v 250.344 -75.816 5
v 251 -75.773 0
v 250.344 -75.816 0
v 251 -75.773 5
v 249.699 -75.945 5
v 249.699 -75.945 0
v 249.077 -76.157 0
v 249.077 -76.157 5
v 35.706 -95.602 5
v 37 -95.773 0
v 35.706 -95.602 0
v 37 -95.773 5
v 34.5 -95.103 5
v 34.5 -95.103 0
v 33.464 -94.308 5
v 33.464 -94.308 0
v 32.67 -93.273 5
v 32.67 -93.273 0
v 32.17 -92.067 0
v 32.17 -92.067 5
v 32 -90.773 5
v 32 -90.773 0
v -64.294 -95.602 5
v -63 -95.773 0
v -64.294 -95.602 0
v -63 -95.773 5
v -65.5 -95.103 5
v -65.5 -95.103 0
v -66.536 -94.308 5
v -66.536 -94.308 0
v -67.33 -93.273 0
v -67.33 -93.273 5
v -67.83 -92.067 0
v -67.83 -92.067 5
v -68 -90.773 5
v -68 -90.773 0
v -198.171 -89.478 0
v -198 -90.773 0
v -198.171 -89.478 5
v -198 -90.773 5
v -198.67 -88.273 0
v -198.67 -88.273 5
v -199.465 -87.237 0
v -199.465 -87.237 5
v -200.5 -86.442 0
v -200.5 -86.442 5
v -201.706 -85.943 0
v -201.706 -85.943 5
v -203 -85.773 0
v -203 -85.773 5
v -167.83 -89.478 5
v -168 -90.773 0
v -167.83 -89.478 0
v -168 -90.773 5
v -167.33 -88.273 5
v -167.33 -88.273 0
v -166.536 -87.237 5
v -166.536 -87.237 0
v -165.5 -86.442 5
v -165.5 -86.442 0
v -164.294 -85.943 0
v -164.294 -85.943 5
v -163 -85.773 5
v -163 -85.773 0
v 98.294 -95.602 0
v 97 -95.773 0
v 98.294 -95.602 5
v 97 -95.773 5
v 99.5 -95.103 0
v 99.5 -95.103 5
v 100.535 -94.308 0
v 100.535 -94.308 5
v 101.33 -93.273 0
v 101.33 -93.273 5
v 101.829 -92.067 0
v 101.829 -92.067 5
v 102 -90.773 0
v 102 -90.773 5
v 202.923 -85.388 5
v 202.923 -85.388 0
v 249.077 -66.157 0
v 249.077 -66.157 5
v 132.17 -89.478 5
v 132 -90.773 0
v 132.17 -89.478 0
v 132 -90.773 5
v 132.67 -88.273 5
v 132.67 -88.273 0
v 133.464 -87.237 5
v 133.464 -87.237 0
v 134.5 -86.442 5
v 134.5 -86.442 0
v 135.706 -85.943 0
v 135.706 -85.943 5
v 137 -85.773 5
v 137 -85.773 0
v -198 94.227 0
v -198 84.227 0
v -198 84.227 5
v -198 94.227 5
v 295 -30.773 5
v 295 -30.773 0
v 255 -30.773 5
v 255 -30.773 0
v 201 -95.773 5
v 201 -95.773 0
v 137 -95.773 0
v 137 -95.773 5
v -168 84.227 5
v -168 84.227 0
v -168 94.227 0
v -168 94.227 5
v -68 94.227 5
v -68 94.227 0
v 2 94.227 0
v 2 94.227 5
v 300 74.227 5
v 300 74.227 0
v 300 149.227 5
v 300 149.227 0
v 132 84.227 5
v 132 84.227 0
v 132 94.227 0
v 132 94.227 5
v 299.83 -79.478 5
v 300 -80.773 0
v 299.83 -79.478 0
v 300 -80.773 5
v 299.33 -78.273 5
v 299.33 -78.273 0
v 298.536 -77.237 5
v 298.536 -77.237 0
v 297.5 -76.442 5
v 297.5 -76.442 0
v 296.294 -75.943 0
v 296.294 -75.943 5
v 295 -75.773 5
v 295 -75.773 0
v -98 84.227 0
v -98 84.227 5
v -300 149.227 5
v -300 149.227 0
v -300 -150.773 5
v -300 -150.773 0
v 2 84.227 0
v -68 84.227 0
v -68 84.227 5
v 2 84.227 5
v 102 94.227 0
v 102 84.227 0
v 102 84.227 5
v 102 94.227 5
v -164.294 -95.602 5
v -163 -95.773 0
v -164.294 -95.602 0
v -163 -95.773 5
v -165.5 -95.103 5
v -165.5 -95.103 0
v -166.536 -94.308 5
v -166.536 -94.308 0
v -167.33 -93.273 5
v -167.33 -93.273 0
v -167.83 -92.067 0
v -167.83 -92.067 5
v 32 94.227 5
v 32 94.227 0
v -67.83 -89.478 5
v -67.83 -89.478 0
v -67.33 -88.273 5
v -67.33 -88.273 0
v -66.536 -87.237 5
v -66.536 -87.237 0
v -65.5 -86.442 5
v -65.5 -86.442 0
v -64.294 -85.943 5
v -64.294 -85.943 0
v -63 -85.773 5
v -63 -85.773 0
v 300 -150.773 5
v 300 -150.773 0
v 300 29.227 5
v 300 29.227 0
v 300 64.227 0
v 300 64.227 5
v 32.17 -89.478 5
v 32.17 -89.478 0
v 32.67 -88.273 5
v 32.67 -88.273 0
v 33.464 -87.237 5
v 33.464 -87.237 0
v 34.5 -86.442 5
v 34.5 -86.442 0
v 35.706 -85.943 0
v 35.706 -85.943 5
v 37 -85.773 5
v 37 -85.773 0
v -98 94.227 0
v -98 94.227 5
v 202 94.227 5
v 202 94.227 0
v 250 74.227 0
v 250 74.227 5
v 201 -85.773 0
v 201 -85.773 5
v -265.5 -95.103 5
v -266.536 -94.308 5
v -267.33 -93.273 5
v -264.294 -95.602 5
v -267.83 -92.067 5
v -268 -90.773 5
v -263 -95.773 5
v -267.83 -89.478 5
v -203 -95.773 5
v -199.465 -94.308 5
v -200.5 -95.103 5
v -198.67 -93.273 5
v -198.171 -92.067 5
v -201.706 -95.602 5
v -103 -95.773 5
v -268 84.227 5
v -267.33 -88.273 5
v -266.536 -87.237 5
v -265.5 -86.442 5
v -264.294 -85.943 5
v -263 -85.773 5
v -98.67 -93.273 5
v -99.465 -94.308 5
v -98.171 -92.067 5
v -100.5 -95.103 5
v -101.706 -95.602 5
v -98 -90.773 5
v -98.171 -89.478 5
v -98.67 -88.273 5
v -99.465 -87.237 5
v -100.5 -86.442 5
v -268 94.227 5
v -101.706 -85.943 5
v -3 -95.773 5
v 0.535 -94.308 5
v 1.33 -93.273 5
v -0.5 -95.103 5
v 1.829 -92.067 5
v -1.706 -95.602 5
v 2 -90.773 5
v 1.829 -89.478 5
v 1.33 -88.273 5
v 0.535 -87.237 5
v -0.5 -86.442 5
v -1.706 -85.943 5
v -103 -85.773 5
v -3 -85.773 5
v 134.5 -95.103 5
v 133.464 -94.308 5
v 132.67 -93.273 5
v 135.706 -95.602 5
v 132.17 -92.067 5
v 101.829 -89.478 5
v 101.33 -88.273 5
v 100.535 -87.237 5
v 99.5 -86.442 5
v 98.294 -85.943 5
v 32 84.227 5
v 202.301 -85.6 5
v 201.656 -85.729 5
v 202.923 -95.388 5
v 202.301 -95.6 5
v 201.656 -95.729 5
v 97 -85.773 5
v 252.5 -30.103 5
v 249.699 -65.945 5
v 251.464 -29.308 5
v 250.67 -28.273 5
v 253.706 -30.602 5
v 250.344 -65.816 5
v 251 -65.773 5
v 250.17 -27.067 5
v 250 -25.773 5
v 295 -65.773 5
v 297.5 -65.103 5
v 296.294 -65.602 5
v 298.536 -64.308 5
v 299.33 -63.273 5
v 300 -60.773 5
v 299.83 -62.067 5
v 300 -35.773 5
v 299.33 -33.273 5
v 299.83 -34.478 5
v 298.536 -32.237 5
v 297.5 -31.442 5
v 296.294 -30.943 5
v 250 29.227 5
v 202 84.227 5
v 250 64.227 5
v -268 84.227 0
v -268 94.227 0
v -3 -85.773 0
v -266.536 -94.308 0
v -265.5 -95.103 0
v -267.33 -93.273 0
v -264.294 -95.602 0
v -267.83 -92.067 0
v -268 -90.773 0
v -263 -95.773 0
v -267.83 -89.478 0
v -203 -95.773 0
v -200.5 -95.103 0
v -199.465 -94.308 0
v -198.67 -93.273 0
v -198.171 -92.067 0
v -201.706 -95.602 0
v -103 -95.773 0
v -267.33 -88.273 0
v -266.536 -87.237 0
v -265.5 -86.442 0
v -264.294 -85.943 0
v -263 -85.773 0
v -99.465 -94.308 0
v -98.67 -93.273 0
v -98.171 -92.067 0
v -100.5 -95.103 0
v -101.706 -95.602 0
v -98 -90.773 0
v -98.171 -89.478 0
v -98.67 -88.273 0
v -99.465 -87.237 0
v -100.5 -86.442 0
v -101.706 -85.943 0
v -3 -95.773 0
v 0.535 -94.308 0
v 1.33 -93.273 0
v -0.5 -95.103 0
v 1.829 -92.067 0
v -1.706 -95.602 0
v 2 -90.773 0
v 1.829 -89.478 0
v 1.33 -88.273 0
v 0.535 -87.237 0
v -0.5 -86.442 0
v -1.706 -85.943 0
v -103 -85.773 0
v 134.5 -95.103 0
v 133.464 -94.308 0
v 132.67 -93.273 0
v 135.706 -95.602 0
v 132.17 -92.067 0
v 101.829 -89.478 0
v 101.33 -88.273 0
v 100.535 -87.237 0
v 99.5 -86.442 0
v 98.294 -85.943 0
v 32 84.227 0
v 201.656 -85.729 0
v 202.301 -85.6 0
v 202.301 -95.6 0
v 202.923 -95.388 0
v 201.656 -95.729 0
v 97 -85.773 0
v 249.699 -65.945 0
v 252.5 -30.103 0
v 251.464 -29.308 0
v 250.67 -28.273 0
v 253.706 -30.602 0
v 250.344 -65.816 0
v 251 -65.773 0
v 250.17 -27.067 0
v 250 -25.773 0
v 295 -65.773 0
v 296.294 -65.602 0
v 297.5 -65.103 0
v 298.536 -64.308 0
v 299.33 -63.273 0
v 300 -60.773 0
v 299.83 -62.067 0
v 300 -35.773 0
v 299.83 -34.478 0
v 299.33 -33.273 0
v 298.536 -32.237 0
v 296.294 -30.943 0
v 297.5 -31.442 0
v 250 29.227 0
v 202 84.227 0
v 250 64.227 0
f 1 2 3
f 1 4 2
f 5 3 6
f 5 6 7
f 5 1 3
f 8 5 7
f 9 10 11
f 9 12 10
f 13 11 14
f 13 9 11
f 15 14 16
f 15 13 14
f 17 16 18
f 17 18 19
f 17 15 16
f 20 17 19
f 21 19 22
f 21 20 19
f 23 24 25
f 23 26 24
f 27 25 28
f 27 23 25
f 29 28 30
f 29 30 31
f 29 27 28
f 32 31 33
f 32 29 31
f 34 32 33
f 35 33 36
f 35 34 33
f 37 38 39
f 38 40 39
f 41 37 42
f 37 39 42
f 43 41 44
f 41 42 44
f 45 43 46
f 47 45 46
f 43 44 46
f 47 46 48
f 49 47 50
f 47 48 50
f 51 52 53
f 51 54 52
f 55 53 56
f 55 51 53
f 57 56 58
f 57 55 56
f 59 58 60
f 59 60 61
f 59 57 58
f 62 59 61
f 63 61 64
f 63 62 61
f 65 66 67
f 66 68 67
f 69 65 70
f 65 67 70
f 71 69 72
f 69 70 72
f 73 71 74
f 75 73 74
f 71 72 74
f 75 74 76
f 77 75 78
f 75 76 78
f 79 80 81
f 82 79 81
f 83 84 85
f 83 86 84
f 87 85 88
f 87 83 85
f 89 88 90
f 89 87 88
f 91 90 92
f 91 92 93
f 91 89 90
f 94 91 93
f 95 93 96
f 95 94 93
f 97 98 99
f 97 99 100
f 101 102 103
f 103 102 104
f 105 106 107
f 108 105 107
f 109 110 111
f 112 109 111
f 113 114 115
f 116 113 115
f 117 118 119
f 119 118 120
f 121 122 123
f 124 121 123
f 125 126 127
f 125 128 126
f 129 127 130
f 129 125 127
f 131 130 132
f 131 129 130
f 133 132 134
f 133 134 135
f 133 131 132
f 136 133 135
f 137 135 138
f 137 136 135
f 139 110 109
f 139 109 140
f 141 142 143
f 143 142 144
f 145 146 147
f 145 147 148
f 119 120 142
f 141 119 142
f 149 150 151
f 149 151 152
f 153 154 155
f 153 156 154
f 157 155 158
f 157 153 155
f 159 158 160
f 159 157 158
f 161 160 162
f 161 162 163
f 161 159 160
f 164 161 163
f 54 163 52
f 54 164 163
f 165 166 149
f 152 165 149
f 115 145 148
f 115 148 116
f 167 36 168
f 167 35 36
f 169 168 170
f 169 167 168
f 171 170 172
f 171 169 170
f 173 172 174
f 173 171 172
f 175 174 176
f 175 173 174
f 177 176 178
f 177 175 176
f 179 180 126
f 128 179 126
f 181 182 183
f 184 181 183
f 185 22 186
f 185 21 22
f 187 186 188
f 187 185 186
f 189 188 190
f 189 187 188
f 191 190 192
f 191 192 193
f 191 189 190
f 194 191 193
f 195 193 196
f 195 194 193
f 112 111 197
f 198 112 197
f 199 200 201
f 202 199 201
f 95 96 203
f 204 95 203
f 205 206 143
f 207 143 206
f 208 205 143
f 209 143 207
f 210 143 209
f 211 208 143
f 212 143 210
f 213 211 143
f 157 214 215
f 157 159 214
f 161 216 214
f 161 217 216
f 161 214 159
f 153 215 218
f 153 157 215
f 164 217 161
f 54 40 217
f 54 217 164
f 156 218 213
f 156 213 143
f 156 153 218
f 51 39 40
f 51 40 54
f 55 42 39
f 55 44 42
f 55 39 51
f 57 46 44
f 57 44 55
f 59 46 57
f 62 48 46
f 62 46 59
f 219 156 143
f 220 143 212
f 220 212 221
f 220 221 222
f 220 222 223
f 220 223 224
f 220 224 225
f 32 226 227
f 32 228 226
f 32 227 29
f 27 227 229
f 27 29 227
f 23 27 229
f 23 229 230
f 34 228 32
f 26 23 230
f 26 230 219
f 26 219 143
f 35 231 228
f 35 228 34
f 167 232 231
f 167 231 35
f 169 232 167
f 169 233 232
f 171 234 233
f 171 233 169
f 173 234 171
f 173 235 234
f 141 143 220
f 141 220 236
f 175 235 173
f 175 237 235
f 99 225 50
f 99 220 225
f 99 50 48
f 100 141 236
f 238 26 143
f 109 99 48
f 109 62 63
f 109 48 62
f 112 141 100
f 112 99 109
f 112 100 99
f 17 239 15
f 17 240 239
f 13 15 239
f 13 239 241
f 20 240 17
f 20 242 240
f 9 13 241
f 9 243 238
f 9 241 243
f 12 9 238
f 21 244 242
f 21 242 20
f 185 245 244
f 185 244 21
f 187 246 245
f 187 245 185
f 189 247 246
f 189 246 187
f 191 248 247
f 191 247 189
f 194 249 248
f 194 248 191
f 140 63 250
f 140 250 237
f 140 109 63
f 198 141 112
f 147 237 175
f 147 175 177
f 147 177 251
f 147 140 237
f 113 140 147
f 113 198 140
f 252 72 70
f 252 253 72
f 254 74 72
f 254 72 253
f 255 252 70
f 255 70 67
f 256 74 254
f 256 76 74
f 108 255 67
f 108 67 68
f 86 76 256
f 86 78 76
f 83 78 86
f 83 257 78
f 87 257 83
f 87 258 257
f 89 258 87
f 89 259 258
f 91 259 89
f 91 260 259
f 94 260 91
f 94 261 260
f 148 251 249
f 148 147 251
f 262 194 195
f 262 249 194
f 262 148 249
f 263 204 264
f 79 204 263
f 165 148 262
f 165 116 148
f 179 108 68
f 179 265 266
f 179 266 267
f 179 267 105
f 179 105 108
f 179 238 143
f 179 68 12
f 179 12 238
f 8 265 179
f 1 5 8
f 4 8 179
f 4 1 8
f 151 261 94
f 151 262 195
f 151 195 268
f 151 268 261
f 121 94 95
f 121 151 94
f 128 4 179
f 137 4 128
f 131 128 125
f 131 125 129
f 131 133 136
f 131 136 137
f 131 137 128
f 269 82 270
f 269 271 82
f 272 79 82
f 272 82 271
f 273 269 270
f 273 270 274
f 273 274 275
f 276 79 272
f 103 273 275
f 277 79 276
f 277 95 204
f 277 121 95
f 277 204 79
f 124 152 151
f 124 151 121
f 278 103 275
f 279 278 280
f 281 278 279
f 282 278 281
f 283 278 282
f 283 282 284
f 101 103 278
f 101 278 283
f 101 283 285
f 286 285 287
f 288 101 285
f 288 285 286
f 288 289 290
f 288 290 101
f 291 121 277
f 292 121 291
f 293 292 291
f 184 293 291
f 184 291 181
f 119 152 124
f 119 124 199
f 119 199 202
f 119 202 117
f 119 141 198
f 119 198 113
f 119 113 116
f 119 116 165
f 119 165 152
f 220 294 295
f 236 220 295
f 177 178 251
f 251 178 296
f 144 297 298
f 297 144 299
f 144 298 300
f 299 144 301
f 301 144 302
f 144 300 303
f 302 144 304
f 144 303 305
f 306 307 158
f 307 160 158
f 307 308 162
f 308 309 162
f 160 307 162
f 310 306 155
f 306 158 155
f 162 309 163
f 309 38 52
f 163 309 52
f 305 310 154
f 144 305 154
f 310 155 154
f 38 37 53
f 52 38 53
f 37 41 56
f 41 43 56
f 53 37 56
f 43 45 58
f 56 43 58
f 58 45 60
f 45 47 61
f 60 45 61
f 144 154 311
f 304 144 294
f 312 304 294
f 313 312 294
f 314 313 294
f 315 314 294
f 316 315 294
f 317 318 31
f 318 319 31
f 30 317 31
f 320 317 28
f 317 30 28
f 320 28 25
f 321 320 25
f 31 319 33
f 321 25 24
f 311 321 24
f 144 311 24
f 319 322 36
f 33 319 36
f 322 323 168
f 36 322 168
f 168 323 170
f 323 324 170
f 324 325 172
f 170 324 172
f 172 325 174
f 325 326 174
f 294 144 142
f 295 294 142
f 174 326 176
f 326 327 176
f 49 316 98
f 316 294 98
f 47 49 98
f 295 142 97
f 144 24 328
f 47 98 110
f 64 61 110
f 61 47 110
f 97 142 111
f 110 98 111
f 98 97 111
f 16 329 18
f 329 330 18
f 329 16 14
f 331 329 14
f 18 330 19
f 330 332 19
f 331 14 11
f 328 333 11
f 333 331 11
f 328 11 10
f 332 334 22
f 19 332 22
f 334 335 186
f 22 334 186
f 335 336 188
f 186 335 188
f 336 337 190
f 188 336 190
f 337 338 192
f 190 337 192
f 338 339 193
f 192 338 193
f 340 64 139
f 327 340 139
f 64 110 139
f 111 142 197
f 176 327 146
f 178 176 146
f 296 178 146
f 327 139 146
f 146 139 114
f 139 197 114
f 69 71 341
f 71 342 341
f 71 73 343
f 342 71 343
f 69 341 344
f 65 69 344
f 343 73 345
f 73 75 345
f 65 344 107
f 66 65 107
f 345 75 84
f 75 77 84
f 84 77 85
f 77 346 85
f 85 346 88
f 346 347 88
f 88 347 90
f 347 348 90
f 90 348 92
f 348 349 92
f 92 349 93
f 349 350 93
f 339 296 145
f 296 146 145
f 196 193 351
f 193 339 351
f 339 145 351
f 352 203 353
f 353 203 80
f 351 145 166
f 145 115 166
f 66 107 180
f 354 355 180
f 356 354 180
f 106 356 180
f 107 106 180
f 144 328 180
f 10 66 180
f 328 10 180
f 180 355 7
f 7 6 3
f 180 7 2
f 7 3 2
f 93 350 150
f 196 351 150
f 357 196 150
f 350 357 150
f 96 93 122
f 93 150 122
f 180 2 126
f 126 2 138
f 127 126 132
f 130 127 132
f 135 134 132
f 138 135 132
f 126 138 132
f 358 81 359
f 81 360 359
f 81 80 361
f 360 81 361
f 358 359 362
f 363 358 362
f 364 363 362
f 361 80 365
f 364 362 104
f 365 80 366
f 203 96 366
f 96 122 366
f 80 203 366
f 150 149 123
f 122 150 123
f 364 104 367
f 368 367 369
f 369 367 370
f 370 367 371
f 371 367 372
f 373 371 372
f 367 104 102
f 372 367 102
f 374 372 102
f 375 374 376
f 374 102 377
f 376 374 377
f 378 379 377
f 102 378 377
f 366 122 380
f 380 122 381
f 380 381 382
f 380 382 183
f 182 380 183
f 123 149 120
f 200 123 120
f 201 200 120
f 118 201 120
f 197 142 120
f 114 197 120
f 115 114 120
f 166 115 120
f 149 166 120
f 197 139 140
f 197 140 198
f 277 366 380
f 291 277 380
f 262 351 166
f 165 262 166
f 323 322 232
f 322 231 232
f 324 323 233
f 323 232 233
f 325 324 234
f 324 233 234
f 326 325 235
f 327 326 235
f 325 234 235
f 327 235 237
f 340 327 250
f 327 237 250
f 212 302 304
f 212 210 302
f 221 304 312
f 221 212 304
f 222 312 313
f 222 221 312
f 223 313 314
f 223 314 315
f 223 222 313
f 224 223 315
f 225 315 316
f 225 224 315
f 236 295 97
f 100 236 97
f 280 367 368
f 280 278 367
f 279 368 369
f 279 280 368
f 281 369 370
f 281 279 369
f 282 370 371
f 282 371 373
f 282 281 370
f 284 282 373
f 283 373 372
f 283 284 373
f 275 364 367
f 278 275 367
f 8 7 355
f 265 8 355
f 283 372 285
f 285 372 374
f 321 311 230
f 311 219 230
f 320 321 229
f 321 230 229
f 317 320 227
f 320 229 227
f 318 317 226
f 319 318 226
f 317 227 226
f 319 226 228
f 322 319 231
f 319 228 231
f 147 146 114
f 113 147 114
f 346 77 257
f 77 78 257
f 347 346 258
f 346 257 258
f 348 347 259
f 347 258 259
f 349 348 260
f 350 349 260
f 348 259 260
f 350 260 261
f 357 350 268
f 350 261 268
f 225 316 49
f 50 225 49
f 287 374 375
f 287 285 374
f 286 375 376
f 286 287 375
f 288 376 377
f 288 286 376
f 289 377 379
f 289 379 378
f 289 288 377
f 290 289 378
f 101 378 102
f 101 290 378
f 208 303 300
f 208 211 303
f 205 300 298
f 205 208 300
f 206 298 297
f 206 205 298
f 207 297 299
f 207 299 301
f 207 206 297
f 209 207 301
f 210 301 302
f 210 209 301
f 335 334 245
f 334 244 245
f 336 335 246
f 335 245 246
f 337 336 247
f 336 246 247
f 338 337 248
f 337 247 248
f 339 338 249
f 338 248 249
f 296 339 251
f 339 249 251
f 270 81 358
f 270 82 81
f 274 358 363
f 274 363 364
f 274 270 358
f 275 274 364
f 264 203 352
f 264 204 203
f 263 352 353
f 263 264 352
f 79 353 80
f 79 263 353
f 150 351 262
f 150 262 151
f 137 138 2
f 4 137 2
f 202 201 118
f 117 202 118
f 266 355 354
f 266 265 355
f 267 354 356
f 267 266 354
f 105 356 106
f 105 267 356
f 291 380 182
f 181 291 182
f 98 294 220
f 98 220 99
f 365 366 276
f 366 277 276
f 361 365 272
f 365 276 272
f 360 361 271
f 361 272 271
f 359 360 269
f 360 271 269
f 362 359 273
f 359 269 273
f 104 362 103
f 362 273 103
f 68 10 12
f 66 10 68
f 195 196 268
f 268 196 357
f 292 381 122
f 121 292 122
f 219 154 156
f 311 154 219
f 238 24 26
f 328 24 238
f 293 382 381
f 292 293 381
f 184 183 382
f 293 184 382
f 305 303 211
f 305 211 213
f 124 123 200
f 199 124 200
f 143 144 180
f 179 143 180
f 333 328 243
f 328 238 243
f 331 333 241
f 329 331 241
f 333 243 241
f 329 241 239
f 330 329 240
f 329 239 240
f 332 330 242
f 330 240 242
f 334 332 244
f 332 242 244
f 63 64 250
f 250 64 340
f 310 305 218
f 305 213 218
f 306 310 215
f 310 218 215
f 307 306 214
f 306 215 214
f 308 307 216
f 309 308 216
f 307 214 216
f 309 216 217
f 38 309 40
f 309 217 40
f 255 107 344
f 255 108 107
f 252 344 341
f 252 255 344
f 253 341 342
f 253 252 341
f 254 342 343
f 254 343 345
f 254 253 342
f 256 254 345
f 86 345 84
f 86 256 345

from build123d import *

# Parameters (mm, degrees)
F0_W     = 70
F0_H     = 10
F1_DEPTH = 5
F2_R     = 4.99999


# Not quite as in the source:
# - a fillet or chamfer is up to 0.001 mm smaller than in the source, because OpenCascade refuses the exact size


with BuildPart() as f1:
    # F0 (on Top) → F1 (new body)
    with BuildSketch(Plane.XY):
        Polygon((300, 149.2274475843), (-300, 149.2274475843), (-300, -150.7725524157), (300, -150.7725524157), (300, -75.7725524157), (250, -75.7725524157), (201.9998562336, -95.7725524157), (131.9998562336, -95.7725524157), (131.9998562336, -85.7725524157), (201.9998562336, -85.7725524157), (250, -65.7725524157), (300, -65.7725524157), (300, -30.7725524157), (250, -30.7725524157), (250, 29.2274475843), (300, 29.2274475843), (300, 64.2274475843), (250, 64.2274475843), (201.9998562336, 84.2274475843), (131.9998562336, 84.2274475843), (131.9998562336, 94.2274475843), (201.9998562336, 94.2274475843), (250, 74.2274475843), (300, 74.2274475843), align=None)
        with Locations((-233.0001437664, -90.7725524157)):
            Rectangle(F0_W, F0_H, mode=Mode.SUBTRACT)
        with Locations((-133.0001437664, -90.7725524157)):
            Rectangle(F0_W, F0_H, mode=Mode.SUBTRACT)
        with Locations((-33.0001437664, -90.7725524157)):
            Rectangle(F0_W, F0_H, mode=Mode.SUBTRACT)
        with Locations((66.9998562336, -90.7725524157)):
            Rectangle(F0_W, F0_H, mode=Mode.SUBTRACT)
        with Locations((-233.0001437664, 89.2274475843)):
            Rectangle(F0_W, F0_H, mode=Mode.SUBTRACT)
        with Locations((-133.0001437664, 89.2274475843)):
            Rectangle(F0_W, F0_H, mode=Mode.SUBTRACT)
        with Locations((-33.0001437664, 89.2274475843)):
            Rectangle(F0_W, F0_H, mode=Mode.SUBTRACT)
        with Locations((66.9998562336, 89.2274475843)):
            Rectangle(F0_W, F0_H, mode=Mode.SUBTRACT)
    extrude(amount=F1_DEPTH)

    # F2 (radius 5 in the source; OpenCascade refuses exactly that, so slightly less here)
    f2_edges = [f1.edges().sort_by_distance(p)[0] for p in [
        (131.999856, -95.772552, 2.5),
        (31.999856, -95.772552, 2.5),
        (-68.000144, -95.772552, 2.5),
        (201.999856, -95.772552, 2.5),
        (250, -75.772552, 2.5),
        (-168.000144, -95.772552, 2.5),
        (-268.000144, -95.772552, 2.5),
        (300, -75.772552, 2.5),
        (300, -65.772552, 2.5),
        (300, -30.772552, 2.5),
        (250, -30.772552, 2.5),
        (250, -65.772552, 2.5),
        (201.999856, -85.772552, 2.5),
        (131.999856, -85.772552, 2.5),
        (101.999856, -85.772552, 2.5),
        (1.999856, -85.772552, 2.5),
        (-98.000144, -85.772552, 2.5),
        (-198.000144, -85.772552, 2.5),
        (31.999856, -85.772552, 2.5),
        (-68.000144, -85.772552, 2.5),
        (-168.000144, -85.772552, 2.5),
        (-268.000144, -85.772552, 2.5),
        (101.999856, -95.772552, 2.5),
        (1.999856, -95.772552, 2.5),
        (-98.000144, -95.772552, 2.5),
        (-198.000144, -95.772552, 2.5),
    ]]
    fillet(f2_edges, radius=F2_R)


solid = f1.part
